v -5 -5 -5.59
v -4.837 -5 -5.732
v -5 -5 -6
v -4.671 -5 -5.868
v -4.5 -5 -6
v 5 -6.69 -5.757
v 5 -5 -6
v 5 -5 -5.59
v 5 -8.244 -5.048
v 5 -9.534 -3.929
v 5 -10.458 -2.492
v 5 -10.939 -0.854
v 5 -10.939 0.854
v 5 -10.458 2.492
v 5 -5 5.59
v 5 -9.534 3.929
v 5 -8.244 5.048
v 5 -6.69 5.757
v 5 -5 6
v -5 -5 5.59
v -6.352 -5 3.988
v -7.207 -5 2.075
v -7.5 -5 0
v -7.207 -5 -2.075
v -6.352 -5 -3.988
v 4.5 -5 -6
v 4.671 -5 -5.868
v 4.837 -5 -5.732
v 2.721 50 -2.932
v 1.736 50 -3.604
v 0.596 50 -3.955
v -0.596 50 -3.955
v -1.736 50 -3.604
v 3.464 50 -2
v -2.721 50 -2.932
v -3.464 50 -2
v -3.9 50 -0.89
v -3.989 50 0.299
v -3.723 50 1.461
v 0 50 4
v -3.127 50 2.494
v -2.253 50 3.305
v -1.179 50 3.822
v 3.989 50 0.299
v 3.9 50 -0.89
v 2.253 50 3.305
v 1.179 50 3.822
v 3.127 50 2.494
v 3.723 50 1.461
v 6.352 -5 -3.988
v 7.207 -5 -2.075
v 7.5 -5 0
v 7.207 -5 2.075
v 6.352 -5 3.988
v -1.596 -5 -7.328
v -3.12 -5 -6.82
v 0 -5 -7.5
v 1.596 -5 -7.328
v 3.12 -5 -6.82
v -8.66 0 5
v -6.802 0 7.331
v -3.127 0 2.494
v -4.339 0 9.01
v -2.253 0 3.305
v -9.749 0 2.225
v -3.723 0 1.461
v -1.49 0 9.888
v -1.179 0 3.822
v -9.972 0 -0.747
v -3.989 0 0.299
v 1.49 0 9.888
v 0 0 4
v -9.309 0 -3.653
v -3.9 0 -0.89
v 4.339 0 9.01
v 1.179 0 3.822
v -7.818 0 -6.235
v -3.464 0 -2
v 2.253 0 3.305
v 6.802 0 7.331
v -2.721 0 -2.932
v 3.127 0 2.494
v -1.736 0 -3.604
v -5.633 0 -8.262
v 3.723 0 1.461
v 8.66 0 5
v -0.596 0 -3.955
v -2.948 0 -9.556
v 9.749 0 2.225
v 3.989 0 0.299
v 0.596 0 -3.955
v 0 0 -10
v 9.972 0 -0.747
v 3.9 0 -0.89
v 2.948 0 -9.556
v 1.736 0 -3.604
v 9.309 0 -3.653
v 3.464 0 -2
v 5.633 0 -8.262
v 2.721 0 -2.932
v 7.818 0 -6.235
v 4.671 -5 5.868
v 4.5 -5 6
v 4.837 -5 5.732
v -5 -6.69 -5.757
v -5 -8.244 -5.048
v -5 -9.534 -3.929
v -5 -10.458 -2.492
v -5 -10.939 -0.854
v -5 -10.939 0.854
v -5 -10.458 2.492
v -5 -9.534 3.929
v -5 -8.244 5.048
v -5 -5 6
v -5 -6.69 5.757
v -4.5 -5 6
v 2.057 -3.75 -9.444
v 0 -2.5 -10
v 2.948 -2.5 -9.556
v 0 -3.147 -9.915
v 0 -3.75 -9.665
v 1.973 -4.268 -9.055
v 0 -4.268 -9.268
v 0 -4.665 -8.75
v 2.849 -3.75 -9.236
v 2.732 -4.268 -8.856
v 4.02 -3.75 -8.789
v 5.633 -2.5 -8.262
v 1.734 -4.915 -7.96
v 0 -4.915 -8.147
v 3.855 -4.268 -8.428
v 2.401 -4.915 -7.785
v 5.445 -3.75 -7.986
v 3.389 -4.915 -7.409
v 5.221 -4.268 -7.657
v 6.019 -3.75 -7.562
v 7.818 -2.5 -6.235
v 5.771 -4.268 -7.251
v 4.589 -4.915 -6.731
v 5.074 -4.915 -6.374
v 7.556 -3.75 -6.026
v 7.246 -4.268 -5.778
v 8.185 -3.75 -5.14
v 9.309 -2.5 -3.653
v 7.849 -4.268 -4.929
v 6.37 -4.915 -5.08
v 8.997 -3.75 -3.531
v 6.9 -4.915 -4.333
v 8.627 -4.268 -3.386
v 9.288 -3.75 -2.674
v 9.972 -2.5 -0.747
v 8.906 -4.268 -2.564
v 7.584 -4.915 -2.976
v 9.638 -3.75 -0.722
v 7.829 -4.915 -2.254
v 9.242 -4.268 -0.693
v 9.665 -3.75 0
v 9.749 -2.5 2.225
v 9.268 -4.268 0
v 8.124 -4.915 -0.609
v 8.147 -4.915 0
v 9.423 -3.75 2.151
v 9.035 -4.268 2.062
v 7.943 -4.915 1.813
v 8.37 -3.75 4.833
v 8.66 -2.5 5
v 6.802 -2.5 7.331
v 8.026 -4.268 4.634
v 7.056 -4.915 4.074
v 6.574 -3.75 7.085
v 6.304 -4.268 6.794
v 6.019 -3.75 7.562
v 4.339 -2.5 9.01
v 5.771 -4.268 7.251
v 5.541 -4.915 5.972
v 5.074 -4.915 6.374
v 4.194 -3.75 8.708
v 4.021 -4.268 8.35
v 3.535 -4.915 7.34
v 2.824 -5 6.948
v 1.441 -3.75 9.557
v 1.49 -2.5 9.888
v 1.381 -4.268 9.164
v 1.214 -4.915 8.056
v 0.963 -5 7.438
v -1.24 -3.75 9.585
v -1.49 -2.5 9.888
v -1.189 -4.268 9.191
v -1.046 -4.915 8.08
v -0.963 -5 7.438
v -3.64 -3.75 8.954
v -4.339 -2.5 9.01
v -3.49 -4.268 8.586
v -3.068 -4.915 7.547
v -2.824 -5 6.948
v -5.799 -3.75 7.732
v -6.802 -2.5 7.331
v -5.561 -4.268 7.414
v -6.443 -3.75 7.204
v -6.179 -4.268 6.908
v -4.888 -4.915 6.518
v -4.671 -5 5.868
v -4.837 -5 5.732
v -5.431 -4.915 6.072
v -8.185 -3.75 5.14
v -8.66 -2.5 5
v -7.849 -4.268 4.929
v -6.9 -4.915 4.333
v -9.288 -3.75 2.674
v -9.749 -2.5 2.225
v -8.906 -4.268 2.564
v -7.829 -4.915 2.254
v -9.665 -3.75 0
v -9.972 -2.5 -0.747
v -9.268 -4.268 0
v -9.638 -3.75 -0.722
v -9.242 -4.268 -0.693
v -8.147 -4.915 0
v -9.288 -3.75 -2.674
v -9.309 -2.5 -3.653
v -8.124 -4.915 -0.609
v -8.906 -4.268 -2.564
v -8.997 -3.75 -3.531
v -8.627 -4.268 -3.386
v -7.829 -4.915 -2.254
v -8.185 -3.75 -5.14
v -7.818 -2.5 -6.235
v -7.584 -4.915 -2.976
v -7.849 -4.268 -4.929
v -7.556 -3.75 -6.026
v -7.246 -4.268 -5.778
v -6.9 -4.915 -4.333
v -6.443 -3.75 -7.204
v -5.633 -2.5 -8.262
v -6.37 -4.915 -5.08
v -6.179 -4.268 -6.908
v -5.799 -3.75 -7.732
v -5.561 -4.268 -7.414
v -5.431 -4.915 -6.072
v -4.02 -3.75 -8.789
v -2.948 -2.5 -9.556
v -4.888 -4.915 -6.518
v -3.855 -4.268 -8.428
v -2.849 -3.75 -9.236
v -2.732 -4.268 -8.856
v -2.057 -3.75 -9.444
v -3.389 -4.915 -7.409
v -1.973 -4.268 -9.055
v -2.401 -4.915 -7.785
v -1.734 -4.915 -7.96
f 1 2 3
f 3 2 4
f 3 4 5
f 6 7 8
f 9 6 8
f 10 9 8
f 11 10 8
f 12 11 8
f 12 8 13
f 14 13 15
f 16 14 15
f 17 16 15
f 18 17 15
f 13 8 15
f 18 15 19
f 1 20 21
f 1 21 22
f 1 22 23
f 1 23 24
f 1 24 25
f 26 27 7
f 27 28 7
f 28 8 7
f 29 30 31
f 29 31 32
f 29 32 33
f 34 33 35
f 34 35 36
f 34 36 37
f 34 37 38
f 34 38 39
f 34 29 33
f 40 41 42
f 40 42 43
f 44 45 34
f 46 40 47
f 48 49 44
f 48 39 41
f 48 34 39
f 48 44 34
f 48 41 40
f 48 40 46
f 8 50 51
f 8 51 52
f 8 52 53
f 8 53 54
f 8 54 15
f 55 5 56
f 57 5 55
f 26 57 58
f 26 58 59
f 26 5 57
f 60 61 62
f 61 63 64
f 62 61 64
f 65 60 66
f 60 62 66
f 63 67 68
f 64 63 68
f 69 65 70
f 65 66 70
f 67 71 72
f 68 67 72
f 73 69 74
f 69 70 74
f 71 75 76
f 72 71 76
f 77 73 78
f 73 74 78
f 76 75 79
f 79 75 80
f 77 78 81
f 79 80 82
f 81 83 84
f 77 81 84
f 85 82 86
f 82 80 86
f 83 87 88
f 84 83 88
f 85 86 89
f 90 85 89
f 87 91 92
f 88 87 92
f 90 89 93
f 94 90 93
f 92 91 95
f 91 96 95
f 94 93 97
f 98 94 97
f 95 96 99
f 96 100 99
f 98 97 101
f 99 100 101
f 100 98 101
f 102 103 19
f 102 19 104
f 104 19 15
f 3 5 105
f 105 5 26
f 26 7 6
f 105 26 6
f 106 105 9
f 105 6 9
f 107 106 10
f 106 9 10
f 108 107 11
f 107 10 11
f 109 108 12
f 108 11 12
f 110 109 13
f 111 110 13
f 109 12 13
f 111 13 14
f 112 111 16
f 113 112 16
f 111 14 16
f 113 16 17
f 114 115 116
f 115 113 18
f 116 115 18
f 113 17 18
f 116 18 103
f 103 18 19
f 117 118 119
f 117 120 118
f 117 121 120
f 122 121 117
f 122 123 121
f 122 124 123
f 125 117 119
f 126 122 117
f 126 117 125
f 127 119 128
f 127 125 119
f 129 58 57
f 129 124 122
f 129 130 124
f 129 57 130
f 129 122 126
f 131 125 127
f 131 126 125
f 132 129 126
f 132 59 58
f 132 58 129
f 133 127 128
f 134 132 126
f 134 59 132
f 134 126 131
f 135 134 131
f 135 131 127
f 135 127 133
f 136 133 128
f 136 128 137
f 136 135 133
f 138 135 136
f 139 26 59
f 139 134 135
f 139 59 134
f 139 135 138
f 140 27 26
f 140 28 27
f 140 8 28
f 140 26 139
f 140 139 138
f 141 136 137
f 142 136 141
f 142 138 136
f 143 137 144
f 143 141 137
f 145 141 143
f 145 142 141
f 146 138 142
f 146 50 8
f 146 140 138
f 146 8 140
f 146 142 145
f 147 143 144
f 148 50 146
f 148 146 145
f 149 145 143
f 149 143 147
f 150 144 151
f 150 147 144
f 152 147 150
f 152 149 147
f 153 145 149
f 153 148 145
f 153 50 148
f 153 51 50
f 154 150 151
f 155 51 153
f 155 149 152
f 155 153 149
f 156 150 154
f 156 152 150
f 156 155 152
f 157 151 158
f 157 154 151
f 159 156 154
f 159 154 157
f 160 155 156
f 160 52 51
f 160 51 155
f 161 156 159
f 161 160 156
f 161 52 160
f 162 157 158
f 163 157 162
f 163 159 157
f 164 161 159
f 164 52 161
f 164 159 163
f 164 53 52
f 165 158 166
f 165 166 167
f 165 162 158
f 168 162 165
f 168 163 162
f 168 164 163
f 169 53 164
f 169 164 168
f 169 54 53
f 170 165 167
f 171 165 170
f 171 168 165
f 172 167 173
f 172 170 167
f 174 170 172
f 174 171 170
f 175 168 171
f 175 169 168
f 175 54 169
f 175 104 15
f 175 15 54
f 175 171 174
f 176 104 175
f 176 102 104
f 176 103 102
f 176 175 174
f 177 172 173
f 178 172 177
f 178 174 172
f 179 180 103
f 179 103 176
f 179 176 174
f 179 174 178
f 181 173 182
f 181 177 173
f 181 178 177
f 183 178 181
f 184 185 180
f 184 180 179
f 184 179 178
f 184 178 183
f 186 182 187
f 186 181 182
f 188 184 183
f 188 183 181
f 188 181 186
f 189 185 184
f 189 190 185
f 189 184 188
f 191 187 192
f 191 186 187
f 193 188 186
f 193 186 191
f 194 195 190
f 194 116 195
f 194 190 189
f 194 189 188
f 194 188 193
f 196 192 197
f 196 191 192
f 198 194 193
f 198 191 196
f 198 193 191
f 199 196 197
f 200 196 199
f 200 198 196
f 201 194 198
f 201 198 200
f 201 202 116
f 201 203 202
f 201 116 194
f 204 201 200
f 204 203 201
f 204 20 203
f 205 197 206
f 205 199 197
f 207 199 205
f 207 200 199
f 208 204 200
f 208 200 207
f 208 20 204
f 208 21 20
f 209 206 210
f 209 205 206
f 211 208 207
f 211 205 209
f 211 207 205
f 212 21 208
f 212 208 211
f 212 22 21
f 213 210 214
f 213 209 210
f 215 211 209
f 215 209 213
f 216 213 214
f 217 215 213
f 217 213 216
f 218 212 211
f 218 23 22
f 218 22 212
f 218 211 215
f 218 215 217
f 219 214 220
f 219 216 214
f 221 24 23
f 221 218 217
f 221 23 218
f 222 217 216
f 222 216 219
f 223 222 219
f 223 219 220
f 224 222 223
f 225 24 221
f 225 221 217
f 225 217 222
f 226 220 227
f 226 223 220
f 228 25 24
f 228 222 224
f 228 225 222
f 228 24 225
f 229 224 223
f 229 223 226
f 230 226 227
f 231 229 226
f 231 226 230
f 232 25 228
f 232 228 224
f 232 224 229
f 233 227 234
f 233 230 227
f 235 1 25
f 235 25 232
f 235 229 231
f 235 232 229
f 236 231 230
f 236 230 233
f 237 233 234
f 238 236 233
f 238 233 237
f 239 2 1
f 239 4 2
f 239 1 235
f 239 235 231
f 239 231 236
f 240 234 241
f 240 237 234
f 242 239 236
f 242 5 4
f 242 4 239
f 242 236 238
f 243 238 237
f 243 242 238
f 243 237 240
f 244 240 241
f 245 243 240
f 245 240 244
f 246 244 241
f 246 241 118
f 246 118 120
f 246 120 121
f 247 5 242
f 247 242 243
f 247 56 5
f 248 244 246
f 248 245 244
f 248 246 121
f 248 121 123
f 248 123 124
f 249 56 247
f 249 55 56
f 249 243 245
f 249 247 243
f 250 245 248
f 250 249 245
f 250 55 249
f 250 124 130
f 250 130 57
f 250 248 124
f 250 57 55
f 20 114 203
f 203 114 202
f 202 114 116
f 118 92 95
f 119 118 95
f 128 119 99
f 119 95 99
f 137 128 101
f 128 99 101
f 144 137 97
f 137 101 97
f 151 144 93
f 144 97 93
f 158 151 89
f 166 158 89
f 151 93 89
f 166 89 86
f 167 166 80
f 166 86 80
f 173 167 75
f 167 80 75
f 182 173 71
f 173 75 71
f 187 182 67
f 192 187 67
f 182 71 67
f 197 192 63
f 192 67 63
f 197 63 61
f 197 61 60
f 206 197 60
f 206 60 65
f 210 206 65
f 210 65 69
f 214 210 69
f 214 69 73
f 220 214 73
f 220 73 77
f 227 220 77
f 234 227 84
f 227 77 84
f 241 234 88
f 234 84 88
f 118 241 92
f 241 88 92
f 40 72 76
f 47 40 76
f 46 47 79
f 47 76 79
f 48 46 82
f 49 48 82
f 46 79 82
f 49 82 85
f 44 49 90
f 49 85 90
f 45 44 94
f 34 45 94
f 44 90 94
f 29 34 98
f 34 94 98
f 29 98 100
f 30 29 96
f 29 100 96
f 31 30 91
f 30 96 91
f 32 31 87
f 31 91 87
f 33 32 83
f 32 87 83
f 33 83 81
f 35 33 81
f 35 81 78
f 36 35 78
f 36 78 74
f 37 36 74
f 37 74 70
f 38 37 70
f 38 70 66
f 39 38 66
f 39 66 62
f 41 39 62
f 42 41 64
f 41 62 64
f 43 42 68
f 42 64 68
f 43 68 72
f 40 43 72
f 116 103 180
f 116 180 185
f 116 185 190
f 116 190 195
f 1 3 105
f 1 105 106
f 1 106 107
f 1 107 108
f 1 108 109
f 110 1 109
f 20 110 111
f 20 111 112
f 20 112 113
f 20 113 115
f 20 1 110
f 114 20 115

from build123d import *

# Parameters (mm, degrees)
SKETCH1_R           = 4
BOSS_EXTRUDE1_DEPTH = 50
SKETCH3_R           = 10
BOSS_EXTRUDE2_DEPTH = 5
FILLET1_R           = 2.5
BOSS_EXTRUDE3_DEPTH = 5


with BuildPart() as part:
    # Sketch1 → Boss-Extrude1 (new body)
    with BuildSketch(Plane(origin=(0, 0, 0), x_dir=(1, 0, 0), z_dir=(0, 1, 0))):
        with Locations(Location((0, 0, 0), (0, 0, 270))):
            Circle(SKETCH1_R)
    extrude(amount=BOSS_EXTRUDE1_DEPTH)

    # Sketch3 → Boss-Extrude2 (add)
    with BuildSketch(Plane.XZ):
        with Locations(Location((0, 0, 0), (0, 0, 270))):
            Circle(SKETCH3_R)
    extrude(amount=BOSS_EXTRUDE2_DEPTH)

    # Fillet1
    fillet1_edges = [part.edges().sort_by_distance(p)[0] for p in [
        (0, -5, 10),
    ]]
    fillet(fillet1_edges, radius=FILLET1_R)

    # Sketch4 → Boss-Extrude3 (add, symmetric)
    with BuildSketch(Plane(origin=(0, 0, 0), x_dir=(0, 0, -1), z_dir=(1, 0, 0))):
        with BuildLine():
            Line((-6, -5), (6, -5))
            ThreePointArc((6, -5), (0, -11), (-6, -5))
        make_face()
    extrude(amount=BOSS_EXTRUDE3_DEPTH, both=True)


solid = part.part
